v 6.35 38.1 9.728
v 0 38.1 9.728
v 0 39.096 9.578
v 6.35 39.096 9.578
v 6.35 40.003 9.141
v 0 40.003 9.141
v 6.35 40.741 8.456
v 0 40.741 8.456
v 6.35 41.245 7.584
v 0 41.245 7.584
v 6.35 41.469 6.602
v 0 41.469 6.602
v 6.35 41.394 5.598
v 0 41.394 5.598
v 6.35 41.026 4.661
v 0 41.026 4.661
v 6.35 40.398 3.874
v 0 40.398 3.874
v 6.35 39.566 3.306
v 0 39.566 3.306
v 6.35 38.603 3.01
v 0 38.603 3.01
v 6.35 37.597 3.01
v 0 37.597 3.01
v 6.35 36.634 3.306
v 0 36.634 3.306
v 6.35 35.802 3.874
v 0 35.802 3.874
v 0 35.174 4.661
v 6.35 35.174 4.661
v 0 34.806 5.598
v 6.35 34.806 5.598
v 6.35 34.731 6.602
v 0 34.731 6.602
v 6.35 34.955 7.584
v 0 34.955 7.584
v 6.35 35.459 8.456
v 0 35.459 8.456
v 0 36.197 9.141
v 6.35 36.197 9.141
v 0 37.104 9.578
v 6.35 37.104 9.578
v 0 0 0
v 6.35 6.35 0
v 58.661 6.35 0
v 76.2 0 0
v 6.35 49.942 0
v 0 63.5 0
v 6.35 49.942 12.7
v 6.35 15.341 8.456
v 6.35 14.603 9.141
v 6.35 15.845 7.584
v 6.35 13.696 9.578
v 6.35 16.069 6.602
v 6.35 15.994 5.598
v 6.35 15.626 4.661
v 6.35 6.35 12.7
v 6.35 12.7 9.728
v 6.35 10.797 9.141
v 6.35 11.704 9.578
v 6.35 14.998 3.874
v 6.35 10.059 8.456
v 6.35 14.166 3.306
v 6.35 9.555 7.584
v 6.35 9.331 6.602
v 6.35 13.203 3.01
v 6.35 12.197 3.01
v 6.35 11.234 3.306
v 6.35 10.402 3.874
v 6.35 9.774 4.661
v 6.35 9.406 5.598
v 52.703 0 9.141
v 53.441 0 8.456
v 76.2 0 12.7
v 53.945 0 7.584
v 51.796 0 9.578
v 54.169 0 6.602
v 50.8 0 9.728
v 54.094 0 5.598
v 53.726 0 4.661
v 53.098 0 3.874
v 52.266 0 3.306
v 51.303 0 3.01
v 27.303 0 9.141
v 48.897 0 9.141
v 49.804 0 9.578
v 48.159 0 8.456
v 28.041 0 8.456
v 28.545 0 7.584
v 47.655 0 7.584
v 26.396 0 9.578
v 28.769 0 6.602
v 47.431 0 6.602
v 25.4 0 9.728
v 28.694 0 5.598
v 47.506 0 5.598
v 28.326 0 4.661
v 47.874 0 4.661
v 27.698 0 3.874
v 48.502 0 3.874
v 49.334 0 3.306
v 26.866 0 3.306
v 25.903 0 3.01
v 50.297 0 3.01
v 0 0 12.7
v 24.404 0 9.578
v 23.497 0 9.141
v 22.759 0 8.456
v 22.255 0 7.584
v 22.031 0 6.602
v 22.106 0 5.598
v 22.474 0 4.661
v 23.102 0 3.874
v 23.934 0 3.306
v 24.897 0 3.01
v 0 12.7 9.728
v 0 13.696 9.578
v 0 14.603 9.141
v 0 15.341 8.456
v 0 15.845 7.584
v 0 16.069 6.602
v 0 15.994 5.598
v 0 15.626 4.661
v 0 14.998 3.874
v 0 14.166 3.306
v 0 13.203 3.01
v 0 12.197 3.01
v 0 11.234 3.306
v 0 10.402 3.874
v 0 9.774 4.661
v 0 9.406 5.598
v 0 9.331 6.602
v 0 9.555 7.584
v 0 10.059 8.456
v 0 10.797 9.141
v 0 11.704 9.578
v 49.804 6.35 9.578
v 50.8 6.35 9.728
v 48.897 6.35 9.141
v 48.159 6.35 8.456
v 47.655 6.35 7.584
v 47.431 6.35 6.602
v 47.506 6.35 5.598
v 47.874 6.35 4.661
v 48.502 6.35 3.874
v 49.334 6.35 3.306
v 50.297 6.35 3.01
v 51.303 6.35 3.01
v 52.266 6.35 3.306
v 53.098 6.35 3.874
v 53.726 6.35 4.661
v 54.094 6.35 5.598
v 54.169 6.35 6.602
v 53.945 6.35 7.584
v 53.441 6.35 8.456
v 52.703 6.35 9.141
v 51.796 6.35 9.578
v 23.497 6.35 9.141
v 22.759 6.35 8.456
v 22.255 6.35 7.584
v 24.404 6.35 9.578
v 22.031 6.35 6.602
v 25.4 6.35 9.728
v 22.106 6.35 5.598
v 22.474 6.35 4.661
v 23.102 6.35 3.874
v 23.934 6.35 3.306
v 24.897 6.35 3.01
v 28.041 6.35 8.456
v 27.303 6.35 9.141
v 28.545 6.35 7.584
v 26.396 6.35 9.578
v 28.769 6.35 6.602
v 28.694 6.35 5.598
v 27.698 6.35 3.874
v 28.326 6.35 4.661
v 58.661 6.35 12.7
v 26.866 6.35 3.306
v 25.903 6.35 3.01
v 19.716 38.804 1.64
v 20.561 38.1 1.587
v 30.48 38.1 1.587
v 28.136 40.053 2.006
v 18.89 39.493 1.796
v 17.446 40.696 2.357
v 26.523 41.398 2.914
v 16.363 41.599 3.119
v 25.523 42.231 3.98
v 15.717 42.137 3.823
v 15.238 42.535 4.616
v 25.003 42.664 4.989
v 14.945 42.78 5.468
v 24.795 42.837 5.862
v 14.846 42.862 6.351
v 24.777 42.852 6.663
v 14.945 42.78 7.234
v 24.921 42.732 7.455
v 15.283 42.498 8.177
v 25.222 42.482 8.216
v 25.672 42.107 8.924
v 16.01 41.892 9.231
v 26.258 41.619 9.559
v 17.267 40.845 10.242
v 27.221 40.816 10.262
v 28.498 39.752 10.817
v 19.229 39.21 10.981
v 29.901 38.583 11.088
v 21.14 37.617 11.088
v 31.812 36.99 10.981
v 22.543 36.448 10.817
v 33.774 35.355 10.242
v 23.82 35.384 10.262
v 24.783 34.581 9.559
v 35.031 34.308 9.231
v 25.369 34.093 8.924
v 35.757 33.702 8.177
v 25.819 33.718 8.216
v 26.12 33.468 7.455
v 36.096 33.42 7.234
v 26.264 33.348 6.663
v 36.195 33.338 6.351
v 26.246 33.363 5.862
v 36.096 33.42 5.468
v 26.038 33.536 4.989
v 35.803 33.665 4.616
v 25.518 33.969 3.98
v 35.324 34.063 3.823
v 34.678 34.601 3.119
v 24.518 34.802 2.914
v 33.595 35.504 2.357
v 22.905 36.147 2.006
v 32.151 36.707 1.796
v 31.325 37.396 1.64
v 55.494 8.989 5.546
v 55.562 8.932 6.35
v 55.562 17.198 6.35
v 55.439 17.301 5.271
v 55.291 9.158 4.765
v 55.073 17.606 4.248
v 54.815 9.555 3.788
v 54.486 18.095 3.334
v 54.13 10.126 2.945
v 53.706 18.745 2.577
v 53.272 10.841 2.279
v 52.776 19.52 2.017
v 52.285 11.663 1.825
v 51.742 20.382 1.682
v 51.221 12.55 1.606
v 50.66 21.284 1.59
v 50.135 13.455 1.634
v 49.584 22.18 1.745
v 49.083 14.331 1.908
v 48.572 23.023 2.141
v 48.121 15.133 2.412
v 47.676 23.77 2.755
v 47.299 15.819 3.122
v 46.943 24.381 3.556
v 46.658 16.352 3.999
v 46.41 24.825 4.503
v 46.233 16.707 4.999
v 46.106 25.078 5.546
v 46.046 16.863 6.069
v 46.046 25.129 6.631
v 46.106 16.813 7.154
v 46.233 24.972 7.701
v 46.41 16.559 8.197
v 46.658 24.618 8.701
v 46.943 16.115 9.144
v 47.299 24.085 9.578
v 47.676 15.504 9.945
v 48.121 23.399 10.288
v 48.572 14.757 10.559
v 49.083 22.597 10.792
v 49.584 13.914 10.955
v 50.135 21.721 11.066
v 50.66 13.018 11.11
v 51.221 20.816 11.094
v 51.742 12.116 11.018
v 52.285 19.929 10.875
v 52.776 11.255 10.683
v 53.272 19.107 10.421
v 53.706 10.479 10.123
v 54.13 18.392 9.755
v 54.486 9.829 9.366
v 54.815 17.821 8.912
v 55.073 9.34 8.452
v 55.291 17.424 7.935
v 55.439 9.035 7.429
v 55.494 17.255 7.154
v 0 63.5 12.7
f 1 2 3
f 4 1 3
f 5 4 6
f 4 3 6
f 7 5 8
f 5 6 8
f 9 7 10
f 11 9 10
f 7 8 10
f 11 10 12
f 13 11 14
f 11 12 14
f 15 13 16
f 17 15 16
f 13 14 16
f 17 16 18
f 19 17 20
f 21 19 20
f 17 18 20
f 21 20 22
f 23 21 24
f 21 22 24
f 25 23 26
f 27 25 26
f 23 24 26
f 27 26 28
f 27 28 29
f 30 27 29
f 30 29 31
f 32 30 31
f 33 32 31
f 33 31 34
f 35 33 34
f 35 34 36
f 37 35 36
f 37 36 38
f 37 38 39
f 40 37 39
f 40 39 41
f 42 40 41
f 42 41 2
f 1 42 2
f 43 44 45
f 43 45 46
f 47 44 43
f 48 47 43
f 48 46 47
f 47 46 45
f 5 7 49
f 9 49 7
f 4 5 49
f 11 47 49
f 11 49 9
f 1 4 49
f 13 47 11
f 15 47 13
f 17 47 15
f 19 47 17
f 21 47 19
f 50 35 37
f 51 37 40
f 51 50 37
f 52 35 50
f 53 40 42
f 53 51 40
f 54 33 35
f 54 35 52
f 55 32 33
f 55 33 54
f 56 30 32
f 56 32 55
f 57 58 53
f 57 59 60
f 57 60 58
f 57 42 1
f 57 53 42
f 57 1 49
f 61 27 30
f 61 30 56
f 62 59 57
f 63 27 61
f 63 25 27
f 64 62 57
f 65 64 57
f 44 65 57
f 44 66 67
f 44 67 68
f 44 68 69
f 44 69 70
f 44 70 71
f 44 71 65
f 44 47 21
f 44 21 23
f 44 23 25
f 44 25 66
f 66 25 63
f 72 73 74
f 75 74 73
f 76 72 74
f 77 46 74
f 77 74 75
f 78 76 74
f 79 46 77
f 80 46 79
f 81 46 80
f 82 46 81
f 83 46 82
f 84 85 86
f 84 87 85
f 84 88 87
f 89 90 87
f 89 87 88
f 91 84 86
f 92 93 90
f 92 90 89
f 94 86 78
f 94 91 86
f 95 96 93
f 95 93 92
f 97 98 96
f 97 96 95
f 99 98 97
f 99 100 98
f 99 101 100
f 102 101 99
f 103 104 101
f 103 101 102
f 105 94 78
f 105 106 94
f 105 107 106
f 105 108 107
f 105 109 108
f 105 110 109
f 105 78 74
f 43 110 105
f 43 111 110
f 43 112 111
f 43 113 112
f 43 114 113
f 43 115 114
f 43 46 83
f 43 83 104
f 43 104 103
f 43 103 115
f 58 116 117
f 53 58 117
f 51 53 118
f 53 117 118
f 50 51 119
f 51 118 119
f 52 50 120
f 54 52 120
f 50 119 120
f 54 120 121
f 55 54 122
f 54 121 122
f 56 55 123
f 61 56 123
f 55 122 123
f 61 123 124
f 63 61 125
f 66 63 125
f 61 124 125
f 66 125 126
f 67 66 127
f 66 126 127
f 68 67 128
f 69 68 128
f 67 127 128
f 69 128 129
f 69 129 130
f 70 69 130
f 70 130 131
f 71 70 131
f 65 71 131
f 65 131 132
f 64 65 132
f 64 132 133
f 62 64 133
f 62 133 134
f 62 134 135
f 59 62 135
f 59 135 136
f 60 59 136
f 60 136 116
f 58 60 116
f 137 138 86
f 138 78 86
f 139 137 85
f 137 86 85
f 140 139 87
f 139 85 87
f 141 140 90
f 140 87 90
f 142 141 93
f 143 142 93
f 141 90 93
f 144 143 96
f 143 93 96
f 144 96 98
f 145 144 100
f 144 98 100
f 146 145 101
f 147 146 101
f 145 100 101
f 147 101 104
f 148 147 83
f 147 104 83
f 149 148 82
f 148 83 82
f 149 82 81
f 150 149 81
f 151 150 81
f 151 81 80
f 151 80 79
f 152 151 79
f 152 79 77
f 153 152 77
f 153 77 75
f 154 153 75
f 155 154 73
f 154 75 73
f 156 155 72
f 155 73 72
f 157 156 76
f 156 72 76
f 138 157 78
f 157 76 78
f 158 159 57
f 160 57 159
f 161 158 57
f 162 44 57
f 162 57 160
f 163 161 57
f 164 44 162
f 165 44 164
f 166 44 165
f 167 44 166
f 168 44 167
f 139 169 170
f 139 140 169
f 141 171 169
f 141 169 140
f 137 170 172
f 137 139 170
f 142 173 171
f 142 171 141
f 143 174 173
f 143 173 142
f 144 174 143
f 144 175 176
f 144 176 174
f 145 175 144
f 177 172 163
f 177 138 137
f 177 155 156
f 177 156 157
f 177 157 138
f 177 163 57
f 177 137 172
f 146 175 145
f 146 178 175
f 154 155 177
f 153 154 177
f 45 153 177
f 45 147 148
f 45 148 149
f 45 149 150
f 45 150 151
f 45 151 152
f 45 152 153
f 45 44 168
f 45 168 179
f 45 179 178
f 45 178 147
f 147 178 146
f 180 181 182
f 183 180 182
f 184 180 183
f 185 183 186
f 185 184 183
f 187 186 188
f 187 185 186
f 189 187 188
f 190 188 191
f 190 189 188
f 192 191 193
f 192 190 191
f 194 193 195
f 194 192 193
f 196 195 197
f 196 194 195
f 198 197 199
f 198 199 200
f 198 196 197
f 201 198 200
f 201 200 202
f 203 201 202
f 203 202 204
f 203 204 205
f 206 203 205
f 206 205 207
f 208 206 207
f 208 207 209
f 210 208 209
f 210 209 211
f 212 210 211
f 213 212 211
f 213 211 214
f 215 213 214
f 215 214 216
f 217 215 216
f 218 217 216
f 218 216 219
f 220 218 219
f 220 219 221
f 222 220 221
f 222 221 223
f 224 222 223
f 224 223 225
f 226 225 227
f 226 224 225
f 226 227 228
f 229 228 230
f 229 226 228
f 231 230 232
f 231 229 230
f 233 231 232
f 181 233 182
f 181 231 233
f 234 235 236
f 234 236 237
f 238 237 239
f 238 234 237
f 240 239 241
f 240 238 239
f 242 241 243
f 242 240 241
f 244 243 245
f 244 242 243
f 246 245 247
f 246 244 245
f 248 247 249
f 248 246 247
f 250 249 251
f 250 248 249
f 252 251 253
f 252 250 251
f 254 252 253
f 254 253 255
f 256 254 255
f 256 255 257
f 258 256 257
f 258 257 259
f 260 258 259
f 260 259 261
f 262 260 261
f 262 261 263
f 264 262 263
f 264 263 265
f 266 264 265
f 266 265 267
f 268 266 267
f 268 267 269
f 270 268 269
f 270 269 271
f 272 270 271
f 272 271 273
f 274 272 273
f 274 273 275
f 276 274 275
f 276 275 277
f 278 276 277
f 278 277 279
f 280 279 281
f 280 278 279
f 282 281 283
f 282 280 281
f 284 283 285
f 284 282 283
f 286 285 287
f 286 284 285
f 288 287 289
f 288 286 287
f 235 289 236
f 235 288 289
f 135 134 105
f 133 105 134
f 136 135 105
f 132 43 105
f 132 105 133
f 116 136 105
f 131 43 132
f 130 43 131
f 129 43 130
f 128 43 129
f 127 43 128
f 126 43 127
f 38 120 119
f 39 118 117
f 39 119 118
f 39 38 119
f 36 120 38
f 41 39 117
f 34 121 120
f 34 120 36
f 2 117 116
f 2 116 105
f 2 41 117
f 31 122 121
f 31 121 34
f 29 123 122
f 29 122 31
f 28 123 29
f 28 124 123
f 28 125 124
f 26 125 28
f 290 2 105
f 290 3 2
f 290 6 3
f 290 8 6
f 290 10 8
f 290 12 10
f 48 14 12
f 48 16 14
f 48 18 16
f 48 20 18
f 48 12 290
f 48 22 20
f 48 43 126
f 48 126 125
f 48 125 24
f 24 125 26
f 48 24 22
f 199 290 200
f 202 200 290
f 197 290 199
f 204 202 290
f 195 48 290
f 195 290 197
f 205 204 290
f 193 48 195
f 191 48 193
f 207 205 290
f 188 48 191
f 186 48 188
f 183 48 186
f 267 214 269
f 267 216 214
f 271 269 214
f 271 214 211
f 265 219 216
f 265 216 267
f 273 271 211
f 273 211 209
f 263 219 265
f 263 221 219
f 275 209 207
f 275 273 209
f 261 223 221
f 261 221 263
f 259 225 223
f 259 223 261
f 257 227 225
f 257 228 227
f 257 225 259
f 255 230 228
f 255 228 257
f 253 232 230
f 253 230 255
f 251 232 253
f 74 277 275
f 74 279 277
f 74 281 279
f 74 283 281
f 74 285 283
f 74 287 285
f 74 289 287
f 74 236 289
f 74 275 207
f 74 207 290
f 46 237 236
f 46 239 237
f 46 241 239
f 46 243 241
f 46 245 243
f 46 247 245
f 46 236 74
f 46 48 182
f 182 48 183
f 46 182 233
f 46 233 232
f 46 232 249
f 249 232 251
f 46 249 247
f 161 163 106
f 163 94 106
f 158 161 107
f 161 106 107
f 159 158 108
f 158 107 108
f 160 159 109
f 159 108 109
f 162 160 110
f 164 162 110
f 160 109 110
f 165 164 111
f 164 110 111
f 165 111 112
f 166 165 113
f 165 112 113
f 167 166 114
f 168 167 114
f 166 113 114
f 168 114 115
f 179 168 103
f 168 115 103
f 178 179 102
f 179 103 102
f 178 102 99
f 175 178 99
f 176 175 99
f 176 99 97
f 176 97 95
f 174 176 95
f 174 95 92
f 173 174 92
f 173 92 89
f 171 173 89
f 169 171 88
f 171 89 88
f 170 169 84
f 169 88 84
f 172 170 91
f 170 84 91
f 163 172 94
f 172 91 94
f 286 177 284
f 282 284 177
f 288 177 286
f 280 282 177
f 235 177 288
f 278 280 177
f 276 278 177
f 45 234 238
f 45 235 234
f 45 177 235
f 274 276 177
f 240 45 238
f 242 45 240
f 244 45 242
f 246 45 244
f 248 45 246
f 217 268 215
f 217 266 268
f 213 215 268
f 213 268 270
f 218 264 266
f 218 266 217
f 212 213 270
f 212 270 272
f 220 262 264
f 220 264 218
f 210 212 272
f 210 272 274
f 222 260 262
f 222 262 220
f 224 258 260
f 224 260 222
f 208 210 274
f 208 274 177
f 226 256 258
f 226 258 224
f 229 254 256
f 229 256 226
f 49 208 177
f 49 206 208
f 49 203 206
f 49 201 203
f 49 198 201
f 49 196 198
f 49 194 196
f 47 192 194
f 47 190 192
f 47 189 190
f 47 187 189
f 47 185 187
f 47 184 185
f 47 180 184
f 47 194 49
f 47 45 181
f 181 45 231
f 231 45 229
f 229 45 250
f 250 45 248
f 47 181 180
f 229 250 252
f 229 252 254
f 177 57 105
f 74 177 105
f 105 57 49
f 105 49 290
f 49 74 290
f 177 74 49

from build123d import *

# Parameters (mm, degrees)
BOSS_EXTRUDE1_DEPTH              = 12.7
F_1_4_CLEARANCE_HOLE1_D          = 6.7564
F_1_4_CLEARANCE_HOLE1_DEPTH      = 6.35
SKETCH4_W                        = 3.3782
SKETCH4_H                        = 6.35
F_1_4_CLEARANCE_HOLE2_AT_2_COUNT = 2
F_1_4_CLEARANCE_HOLE2_AT_2_PITCH = 25.4
SKETCH6_R                        = 4.7625
CUT_EXTRUDE1_DEPTH               = 70.85
SKETCH7_R                        = 4.7625
CUT_EXTRUDE2_DEPTH               = 58.15


with BuildPart() as part:
    # Sketch1 → Boss-Extrude1 (new body)
    with BuildSketch(Plane.XY):
        Polygon((0, 0), (0, 63.5), (76.2, 0), align=None)
        Polygon((6.35, 49.94248576), (6.35, 6.35), (58.660982912, 6.35), align=None, mode=Mode.SUBTRACT)
    extrude(amount=BOSS_EXTRUDE1_DEPTH)

    # 1/4 Clearance Hole1
    with Locations(Plane(origin=(6.35, 0, 0), x_dir=(0, 0, -1), z_dir=(1, 0, 0))):
        with Locations((-6.35, 12.7), (-6.35, 38.1)):
            Hole(F_1_4_CLEARANCE_HOLE1_D / 2, depth=F_1_4_CLEARANCE_HOLE1_DEPTH)

    # Sketch4 → 1/4 Clearance Hole2 (revolve, cut)
    with BuildSketch(Plane(origin=(25.4, 6.35, 6.35), x_dir=(0, 0, 1), z_dir=(1, 0, 0))):
        with Locations((1.6891, 3.175)):
            Rectangle(SKETCH4_W, SKETCH4_H)
    f_1_4_clearance_hole2 = revolve(axis=Axis((25.4, 12.7, 6.35), (0, -1, 0)), mode=Mode.SUBTRACT)

    # 1/4 Clearance Hole2 at 2: 1/4 Clearance Hole2 ×2
    with Locations(*[(i * F_1_4_CLEARANCE_HOLE2_AT_2_PITCH, 0, 0) for i in range(1, F_1_4_CLEARANCE_HOLE2_AT_2_COUNT)]):
        add(f_1_4_clearance_hole2, mode=Mode.SUBTRACT)

    # Sketch6 → Cut-Extrude1 (cut, through all)
    with BuildSketch(Plane(origin=(6.35, 0, 0), x_dir=(0, 0, -1), z_dir=(1, 0, 0))):
        with Locations((-6.35, 38.1)):
            Circle(SKETCH6_R)
    extrude(amount=CUT_EXTRUDE1_DEPTH, mode=Mode.SUBTRACT)

    # Sketch7 → Cut-Extrude2 (cut, through all)
    with BuildSketch(Plane(origin=(0, 6.35, 0), x_dir=(1, 0, 0), z_dir=(0, 1, 0))):
        with Locations((50.8, -6.35)):
            Circle(SKETCH7_R)
    extrude(amount=CUT_EXTRUDE2_DEPTH, mode=Mode.SUBTRACT)


solid = part.part
